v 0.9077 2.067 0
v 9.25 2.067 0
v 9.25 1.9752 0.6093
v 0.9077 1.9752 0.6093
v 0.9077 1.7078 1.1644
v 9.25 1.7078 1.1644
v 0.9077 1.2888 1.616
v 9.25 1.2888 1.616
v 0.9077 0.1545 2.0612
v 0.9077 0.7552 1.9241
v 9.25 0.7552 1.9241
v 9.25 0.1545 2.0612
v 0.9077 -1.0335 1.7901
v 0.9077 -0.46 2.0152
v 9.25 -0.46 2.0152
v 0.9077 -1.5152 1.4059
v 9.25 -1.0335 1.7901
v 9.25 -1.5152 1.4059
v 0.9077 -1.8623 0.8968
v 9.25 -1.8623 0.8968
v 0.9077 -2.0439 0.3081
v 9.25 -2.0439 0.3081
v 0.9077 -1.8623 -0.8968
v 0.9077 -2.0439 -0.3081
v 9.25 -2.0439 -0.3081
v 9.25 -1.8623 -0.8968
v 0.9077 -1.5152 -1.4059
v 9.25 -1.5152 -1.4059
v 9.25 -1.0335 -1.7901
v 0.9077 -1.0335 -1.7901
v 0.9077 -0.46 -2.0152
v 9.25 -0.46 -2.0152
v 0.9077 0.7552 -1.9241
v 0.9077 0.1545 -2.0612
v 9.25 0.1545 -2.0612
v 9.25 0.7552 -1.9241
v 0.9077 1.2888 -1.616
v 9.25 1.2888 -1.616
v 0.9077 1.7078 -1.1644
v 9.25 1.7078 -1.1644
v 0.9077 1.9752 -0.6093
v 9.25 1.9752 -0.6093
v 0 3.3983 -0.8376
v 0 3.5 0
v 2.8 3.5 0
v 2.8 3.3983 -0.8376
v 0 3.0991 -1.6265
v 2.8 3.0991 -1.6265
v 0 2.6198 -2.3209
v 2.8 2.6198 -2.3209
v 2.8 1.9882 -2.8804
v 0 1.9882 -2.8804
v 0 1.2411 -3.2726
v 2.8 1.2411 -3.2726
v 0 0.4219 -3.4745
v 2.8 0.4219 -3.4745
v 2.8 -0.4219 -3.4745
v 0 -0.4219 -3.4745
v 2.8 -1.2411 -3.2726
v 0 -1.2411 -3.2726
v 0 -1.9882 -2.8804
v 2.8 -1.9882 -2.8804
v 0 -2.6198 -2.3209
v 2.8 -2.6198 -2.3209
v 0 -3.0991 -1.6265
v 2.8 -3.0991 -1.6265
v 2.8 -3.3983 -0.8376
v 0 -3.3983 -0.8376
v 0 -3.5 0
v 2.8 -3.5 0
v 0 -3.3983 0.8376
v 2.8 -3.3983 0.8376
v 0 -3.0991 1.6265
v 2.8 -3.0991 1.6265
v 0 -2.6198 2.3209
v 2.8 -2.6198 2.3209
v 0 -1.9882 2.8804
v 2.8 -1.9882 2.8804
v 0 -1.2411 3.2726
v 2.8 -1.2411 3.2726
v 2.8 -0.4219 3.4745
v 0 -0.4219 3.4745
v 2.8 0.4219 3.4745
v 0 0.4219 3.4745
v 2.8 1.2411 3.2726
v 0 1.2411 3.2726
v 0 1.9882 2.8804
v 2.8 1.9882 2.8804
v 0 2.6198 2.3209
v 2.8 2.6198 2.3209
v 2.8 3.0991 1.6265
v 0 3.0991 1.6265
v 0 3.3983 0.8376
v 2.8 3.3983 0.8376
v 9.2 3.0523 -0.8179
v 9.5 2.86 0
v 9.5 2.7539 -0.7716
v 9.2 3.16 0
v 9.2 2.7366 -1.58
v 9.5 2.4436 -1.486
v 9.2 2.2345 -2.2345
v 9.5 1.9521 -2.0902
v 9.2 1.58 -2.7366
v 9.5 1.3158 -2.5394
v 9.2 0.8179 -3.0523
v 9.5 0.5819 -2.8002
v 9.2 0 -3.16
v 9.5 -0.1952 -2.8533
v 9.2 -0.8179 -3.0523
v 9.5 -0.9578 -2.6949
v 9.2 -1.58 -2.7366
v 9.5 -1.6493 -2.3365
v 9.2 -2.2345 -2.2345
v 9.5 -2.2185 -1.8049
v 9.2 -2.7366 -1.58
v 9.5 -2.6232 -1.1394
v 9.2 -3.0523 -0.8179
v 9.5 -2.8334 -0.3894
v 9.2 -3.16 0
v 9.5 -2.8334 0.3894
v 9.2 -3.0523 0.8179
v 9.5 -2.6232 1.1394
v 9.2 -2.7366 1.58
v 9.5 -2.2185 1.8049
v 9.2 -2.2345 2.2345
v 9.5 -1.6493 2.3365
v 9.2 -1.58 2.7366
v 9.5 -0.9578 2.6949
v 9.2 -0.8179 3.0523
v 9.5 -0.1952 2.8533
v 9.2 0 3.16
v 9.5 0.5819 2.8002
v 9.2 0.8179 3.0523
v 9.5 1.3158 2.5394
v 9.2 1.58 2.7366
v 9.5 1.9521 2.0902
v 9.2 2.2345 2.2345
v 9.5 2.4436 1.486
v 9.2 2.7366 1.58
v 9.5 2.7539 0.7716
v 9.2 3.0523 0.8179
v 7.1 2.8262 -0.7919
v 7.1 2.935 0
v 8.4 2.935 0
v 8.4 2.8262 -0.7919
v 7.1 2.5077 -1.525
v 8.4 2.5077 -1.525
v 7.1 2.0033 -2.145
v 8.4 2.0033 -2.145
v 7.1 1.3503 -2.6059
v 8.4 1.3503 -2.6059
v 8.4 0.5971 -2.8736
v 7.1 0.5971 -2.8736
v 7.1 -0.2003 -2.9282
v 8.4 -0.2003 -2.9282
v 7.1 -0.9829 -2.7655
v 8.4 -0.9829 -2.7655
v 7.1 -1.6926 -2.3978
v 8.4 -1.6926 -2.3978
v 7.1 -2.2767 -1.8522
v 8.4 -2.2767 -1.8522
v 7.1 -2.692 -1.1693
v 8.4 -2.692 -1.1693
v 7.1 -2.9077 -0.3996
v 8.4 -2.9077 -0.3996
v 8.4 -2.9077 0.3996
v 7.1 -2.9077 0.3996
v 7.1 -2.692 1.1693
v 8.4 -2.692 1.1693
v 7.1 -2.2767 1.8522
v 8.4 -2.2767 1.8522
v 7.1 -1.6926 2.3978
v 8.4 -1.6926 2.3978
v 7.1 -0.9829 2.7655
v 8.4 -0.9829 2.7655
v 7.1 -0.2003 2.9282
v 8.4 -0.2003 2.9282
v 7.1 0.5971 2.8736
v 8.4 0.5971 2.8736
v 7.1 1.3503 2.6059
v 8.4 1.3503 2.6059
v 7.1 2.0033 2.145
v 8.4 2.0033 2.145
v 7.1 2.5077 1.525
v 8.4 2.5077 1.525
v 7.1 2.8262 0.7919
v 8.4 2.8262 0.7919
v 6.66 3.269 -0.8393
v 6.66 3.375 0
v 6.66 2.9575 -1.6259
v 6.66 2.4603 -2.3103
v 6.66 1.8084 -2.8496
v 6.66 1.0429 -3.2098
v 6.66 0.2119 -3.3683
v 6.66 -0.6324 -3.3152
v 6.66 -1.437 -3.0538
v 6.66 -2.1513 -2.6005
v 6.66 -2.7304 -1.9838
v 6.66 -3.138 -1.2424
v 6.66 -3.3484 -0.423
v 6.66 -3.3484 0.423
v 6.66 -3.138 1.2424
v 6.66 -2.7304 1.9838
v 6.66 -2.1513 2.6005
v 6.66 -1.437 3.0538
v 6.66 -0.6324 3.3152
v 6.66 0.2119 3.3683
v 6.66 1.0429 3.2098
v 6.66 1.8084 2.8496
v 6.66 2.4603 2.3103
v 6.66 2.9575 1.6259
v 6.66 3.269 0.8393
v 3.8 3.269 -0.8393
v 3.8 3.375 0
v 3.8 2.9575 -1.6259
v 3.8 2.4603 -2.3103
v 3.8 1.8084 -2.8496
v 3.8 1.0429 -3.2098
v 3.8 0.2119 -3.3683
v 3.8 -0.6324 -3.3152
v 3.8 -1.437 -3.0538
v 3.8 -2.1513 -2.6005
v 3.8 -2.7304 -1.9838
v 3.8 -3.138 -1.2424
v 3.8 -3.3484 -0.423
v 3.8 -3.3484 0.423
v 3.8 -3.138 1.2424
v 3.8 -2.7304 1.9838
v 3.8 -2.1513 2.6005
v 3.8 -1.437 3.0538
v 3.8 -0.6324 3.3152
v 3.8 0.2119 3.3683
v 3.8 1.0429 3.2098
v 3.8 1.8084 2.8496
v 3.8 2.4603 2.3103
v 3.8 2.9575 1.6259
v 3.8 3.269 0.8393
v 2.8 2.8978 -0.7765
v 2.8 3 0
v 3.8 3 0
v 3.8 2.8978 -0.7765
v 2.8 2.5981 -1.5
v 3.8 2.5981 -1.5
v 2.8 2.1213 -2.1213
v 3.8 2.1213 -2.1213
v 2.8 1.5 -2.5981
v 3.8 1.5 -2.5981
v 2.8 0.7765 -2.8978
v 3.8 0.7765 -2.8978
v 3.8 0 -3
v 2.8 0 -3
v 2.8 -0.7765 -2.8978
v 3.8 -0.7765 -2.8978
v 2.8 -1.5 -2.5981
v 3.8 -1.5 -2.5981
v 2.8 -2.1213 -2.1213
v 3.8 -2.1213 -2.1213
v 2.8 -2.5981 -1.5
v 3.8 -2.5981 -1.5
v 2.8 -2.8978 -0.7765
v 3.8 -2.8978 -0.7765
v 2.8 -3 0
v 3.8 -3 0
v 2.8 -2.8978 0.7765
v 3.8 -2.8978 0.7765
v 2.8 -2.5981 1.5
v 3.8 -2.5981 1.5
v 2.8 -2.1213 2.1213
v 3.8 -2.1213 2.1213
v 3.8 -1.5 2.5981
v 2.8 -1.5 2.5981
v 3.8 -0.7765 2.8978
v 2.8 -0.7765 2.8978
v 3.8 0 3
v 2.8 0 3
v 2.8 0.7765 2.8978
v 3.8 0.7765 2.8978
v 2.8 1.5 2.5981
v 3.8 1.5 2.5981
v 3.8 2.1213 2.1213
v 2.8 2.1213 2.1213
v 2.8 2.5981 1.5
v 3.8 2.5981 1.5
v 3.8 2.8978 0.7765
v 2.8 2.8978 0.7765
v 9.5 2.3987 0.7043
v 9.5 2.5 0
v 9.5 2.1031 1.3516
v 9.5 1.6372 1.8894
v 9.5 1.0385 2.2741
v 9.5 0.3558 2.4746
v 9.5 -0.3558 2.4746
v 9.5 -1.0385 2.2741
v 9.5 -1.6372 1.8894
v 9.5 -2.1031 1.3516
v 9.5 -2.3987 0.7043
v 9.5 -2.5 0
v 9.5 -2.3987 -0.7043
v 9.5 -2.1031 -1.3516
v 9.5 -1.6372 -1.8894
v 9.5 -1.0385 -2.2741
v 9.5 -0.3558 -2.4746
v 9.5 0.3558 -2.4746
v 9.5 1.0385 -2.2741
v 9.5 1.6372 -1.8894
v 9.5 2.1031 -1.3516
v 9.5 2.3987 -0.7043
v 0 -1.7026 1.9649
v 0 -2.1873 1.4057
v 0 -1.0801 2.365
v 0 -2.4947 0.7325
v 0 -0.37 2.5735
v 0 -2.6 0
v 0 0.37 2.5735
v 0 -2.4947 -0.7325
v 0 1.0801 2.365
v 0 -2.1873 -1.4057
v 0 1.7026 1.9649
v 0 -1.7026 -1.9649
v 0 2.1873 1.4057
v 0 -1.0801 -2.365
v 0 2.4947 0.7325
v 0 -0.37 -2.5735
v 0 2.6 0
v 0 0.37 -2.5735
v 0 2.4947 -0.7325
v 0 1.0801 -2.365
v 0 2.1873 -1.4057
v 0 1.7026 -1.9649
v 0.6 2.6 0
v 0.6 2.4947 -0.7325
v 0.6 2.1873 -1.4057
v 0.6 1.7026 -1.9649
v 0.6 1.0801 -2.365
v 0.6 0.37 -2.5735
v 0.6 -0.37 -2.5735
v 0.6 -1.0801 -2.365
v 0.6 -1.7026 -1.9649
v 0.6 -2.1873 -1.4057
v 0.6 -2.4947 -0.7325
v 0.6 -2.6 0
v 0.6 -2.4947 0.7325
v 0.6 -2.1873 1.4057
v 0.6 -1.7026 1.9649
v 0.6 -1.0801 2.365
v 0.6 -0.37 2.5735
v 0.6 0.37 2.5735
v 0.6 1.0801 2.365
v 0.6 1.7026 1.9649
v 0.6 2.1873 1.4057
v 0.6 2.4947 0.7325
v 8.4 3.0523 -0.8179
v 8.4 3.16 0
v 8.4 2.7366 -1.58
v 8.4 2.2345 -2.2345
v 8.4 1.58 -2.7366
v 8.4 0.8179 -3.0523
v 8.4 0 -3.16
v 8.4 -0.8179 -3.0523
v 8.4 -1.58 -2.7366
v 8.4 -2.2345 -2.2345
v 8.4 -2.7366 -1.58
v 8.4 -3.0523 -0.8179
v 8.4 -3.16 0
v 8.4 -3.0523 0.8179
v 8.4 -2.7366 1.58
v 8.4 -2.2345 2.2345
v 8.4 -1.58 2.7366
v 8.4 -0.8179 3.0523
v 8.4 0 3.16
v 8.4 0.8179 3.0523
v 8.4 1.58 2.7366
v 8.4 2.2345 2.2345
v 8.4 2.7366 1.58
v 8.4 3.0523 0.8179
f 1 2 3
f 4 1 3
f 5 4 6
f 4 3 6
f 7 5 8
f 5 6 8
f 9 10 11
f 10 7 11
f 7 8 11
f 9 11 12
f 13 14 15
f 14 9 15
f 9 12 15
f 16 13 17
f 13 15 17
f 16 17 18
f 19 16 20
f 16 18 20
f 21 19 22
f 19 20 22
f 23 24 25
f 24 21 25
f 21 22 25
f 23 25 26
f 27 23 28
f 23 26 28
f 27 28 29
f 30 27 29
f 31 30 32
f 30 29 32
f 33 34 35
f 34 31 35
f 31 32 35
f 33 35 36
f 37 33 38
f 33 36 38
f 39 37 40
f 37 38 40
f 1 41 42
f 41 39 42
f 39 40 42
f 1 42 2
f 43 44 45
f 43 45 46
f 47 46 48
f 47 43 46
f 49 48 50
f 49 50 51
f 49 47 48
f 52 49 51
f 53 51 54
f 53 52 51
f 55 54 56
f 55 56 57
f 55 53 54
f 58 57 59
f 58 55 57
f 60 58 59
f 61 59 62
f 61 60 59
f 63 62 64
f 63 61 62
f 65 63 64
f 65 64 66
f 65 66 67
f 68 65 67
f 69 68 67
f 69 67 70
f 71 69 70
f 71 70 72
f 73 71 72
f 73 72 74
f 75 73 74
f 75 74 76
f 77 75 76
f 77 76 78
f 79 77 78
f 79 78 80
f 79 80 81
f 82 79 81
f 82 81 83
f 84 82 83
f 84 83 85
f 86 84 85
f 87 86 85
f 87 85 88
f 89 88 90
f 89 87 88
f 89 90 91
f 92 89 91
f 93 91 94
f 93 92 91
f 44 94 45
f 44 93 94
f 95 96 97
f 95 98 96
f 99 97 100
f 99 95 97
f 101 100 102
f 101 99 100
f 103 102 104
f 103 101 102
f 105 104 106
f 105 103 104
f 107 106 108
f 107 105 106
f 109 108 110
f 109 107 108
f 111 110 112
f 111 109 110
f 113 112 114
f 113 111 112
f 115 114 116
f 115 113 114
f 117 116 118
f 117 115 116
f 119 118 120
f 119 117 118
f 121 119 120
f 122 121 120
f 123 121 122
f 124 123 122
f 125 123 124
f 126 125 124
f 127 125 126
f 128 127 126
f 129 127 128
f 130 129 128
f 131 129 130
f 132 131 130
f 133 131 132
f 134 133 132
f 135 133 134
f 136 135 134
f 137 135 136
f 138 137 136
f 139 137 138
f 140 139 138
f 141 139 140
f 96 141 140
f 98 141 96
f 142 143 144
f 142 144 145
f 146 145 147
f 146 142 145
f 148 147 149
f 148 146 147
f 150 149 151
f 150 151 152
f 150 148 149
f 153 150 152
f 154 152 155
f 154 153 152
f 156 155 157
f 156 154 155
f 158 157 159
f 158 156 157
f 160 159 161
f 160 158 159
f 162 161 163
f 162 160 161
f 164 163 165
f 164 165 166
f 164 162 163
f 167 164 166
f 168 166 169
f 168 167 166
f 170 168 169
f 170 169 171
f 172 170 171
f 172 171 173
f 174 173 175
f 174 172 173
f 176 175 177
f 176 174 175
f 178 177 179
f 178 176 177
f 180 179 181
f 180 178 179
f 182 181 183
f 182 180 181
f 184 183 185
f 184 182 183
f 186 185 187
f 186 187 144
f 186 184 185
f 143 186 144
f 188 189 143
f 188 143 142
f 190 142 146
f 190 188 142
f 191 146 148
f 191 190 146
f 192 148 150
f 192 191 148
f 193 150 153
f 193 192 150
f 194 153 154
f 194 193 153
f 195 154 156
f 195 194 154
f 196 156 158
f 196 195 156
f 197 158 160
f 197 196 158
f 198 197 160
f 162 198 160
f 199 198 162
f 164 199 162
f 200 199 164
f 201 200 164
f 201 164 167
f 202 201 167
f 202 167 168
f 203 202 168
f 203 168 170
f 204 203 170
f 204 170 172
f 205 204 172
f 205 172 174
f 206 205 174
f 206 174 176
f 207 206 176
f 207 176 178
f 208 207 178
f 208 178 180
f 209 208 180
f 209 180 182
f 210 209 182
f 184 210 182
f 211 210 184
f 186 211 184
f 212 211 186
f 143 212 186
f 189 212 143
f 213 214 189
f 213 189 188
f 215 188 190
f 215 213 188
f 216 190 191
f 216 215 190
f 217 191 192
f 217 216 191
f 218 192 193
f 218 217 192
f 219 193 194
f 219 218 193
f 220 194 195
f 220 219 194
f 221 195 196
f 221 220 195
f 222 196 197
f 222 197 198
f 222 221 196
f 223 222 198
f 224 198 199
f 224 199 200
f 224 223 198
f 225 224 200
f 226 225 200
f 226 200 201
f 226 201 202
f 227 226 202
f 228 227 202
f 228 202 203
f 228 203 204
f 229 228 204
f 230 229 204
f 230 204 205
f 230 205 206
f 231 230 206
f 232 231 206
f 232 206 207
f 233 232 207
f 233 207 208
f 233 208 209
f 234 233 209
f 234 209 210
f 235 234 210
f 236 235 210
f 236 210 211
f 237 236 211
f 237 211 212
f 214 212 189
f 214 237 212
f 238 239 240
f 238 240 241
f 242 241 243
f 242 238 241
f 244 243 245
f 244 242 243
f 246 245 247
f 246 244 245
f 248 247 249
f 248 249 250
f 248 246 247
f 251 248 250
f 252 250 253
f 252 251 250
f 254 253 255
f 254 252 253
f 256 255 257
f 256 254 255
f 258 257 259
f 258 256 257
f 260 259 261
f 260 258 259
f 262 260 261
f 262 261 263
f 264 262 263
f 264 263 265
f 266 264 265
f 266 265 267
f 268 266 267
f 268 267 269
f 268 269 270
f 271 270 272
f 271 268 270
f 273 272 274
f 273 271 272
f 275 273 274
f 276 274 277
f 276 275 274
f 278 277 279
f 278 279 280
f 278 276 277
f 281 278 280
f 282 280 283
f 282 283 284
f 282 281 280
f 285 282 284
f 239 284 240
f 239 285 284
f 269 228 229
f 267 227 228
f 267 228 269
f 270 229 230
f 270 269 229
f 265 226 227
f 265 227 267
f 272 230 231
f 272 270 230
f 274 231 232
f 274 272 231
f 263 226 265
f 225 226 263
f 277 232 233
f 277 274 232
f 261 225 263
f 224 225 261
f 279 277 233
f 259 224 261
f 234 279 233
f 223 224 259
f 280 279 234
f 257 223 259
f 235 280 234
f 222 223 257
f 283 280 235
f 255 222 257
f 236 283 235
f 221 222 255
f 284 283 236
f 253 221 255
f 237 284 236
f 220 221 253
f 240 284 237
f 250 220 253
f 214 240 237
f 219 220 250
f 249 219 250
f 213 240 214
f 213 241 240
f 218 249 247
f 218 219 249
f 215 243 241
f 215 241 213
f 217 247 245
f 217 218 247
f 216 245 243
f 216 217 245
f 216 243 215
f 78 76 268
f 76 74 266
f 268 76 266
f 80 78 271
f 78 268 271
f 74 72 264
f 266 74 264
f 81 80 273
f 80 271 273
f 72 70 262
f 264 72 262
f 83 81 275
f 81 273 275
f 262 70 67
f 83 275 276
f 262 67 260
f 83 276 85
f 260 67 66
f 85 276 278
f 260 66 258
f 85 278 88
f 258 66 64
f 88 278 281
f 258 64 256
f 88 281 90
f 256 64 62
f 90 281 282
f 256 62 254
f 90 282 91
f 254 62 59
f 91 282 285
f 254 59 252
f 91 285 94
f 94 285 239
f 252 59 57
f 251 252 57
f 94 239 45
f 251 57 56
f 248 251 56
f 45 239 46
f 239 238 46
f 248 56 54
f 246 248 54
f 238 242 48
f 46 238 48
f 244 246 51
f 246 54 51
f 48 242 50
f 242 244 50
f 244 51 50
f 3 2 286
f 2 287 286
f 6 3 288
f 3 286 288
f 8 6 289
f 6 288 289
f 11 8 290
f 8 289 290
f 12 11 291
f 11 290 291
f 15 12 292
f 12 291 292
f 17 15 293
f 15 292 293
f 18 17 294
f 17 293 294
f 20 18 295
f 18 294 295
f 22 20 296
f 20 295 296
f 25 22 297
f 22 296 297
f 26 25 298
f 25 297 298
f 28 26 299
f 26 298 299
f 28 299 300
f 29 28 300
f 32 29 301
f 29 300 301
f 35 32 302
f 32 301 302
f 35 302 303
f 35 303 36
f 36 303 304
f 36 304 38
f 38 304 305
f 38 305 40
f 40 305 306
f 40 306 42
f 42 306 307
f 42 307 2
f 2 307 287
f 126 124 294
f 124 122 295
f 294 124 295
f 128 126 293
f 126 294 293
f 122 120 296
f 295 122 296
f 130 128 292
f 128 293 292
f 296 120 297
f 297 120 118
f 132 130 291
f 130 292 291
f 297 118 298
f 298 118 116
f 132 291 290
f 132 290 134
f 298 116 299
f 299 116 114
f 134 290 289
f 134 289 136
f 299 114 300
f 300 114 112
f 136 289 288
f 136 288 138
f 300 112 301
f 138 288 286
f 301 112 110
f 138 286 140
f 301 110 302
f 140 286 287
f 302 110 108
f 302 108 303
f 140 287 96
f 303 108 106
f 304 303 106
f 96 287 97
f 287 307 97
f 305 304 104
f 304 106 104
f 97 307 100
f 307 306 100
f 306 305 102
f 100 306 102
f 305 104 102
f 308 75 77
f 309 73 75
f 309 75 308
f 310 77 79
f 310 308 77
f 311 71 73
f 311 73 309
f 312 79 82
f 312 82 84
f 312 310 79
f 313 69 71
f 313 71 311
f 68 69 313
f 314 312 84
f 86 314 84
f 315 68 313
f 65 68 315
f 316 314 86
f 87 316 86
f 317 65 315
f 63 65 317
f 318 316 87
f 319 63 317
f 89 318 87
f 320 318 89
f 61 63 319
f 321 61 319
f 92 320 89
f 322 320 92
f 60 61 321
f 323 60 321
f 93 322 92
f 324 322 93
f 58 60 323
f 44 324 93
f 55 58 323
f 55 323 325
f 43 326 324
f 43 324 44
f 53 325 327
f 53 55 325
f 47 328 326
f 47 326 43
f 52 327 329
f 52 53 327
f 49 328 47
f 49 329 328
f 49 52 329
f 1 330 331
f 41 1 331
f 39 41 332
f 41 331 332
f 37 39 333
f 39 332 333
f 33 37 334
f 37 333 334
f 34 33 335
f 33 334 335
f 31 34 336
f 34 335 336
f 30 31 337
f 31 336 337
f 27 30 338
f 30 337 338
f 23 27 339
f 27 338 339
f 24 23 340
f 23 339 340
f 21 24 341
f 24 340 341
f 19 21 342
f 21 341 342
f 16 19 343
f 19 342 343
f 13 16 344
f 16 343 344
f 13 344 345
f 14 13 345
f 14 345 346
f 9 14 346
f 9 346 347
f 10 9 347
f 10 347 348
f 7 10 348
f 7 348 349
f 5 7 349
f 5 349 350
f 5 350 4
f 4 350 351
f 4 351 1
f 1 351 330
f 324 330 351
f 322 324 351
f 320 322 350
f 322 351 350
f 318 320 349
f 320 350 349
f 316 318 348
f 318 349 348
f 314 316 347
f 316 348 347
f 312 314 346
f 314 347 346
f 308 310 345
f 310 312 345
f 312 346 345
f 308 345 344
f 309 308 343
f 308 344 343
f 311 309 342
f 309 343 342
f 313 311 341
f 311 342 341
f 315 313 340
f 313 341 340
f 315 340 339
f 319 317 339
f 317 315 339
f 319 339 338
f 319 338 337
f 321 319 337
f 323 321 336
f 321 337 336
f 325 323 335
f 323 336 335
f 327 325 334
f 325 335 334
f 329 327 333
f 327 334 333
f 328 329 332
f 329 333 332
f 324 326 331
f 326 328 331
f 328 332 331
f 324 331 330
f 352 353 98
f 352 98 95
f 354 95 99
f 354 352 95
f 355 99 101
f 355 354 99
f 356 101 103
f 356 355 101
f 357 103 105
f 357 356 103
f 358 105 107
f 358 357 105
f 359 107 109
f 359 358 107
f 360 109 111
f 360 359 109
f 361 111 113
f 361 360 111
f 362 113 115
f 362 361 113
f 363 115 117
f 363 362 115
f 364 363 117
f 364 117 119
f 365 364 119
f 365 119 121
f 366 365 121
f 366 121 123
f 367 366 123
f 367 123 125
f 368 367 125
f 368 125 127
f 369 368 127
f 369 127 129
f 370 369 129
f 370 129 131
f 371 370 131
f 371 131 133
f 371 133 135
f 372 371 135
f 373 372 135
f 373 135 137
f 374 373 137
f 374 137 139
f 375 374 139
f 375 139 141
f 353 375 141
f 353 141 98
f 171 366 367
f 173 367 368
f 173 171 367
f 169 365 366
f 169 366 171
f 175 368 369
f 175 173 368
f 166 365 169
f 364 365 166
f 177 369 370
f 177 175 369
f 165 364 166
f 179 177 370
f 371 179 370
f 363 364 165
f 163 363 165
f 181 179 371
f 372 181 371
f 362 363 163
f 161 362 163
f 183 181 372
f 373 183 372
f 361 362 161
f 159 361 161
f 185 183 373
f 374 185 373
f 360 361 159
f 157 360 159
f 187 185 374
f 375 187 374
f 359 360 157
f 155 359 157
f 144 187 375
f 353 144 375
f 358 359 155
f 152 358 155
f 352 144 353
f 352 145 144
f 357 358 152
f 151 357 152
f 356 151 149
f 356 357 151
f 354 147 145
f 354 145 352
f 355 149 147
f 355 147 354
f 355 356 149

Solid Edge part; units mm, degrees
sketch "Sketch1" plane through (0, 0, 0) normal (0, 0, 1) x (1, 0, 0)
  line L0 (0, 3.5) -> (0, 2.6)
  line L1 (0, 2.6) -> (0.6, 2.6)
  line L2 (0.6, 2.6) -> (0.9077, 2.067)
  line L3 (0.9077, 2.067) -> (9.25, 2.067)
  line L4 (9.25, 2.067) -> (9.5, 2.5)
  line L5 (9.5, 2.5) -> (9.5, 2.86)
  line L6 (9.5, 2.86) -> (9.2, 3.16)
  line L7 (9.2, 3.16) -> (8.4, 3.16)
  line L8 (8.4, 3.16) -> (8.4, 2.935)
  line L9 (8.4, 2.935) -> (7.1, 2.935)
  line L10 (7.1, 2.935) -> (6.66, 3.375)
  line L11 (6.66, 3.375) -> (3.8, 3.375)
  line L12 (3.8, 3.375) -> (3.8, 3)
  line L13 (3.8, 3) -> (2.8, 3)
  line L14 (2.8, 3) -> (2.8, 3.5)
  line L15 (2.8, 3.5) -> (0, 3.5)
revolve "RevolvedProtrusion1" add sketch "Sketch1" angle 360 about axis through (9.5, 0, 0) along (-1, 0, 0)
cosmetic_thread "Thread1" size "M5"
properties part number "KerbKonus 860000050800"
